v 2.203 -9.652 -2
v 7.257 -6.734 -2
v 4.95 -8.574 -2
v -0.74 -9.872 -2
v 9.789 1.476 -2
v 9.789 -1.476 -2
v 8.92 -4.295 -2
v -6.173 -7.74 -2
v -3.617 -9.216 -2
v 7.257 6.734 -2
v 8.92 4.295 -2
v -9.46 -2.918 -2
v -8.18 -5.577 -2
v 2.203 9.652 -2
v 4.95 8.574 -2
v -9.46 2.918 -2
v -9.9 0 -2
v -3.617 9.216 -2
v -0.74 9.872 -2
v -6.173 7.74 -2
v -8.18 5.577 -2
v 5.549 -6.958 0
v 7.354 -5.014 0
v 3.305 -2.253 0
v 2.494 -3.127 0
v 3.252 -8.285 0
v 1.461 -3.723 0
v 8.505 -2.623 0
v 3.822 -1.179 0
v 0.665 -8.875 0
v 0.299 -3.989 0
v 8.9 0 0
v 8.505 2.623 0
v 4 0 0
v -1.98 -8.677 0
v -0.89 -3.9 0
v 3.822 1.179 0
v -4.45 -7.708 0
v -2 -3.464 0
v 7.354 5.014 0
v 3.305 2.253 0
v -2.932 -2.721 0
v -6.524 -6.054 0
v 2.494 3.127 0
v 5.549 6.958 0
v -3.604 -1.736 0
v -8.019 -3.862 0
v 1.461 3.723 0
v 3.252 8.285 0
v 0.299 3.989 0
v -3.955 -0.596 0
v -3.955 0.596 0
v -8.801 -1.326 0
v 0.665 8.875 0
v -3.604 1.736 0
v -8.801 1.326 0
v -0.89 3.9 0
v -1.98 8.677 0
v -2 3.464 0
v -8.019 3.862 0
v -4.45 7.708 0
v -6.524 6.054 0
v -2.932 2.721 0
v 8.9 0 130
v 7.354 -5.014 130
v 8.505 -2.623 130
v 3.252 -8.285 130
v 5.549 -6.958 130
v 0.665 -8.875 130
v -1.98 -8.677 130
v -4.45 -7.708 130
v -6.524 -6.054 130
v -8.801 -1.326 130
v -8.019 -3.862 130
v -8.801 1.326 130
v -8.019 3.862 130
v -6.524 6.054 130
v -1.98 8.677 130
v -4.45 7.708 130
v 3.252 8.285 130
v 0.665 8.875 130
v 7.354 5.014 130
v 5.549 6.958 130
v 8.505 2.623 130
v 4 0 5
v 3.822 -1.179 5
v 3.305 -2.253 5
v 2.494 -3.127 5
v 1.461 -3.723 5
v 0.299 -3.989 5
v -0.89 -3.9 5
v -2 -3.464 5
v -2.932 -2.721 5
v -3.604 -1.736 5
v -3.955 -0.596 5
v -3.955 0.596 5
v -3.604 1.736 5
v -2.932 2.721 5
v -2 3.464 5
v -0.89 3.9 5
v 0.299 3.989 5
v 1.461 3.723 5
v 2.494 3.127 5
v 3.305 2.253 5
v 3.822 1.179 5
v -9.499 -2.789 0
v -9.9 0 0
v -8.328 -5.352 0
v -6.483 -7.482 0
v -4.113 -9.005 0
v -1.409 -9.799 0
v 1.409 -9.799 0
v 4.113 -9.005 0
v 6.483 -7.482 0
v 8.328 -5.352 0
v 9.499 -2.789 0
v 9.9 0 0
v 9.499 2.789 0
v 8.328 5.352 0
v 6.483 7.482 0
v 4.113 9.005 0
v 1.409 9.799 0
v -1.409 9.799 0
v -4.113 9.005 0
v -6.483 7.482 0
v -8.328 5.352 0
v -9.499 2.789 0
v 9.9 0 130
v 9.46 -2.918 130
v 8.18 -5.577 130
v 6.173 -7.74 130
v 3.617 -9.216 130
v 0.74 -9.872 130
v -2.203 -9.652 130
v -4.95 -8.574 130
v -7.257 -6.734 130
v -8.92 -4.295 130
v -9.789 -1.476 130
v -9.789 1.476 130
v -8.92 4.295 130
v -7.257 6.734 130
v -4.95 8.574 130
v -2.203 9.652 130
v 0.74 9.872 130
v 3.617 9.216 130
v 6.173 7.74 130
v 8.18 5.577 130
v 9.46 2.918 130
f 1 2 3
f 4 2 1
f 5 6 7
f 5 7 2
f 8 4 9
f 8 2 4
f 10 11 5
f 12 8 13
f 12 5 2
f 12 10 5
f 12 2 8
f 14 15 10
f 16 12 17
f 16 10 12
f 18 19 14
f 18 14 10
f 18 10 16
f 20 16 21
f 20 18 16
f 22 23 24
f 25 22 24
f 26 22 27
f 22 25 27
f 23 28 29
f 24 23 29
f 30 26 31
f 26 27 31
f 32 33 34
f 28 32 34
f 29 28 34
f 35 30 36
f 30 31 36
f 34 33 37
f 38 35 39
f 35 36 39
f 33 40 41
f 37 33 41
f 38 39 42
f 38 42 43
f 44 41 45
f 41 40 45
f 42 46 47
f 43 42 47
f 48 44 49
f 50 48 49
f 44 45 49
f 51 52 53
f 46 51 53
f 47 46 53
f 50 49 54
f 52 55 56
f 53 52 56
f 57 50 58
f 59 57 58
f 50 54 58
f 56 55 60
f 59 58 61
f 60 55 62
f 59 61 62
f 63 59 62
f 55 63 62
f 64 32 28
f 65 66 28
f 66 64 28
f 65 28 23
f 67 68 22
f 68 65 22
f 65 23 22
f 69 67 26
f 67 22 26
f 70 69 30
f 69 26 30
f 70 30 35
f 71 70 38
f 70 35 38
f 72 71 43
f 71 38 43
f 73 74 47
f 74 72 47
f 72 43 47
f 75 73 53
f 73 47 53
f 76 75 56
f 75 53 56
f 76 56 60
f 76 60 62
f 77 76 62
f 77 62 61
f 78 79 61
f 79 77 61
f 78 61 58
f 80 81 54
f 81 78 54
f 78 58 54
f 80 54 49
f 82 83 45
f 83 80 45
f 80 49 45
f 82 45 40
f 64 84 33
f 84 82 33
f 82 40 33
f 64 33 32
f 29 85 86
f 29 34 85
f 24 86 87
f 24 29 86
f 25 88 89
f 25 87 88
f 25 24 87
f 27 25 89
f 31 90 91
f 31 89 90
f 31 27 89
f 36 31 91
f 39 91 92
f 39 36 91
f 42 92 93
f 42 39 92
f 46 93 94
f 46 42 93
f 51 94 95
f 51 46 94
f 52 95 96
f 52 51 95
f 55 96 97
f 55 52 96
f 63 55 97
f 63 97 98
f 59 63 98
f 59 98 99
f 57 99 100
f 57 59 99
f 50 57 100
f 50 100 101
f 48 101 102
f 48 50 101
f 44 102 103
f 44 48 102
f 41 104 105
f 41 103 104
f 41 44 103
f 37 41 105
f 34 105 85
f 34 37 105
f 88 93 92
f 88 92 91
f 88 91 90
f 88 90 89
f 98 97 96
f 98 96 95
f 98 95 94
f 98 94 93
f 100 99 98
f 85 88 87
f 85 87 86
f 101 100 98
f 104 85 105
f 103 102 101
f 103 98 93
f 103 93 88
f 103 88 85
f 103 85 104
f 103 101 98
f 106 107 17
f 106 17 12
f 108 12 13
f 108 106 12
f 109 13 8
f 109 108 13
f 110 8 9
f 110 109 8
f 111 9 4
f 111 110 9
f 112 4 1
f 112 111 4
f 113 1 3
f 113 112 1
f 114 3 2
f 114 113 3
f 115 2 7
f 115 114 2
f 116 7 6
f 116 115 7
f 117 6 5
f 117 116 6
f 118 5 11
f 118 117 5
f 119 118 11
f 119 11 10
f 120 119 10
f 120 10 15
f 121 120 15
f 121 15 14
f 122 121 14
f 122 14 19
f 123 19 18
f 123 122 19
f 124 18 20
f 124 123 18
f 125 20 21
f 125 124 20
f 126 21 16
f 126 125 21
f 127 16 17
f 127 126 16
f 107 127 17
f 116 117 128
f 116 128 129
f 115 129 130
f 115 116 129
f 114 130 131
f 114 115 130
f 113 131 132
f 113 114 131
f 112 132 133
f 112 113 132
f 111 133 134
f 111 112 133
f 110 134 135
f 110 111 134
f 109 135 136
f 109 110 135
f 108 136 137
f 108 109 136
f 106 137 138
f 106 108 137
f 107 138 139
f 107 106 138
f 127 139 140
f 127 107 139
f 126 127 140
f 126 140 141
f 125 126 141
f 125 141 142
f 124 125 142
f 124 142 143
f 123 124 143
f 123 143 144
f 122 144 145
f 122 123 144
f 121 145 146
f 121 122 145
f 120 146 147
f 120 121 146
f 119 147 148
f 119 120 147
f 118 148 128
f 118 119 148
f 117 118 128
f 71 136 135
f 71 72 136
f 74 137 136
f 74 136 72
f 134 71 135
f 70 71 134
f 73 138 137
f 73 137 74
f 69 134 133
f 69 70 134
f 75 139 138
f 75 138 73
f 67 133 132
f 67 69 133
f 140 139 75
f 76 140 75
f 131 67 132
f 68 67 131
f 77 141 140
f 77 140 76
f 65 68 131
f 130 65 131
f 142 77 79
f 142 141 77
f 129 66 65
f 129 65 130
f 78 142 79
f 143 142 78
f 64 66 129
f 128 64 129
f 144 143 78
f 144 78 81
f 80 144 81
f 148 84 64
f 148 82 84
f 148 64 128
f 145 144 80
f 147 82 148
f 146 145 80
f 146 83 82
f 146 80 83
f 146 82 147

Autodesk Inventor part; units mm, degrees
ref_plane "YZ Plane" through (0, 0, 0) normal (1, 0, 0) x (0, 1, 0)
ref_plane "XZ Plane" through (0, 0, 0) normal (0, 1, 0) x (-1, 0, 0)
ref_plane "XY Plane" through (0, 0, 0) normal (0, 0, 1) x (1, 0, 0)
sketch "Sketch1" plane through (0, 0, 0) normal (0, 0, 1) x (1, 0, 0)
  circle A0 centre (0, 0) radius 8.9
  circle A1 centre (0, 0) radius 9.9
  dimension "d0" = 17.8
  dimension "d1" = 19.8
extrude "Extrusion1" add sketch "Sketch1" along normal blind 130
sketch "Sketch2" plane through (0, 0, 0) normal (0, 0, -1) x (-1, 0, 0)
  circle A0 centre (0, 0) radius 9.9
  circle A1 centre (0, 0) radius 4
  dimension "d4" = 8
extrude "Extrusion2" add sketch "Sketch2" along normal blind 2 contours A0 | A1
sketch "Sketch3" plane through (0, 0, 0) normal (0, 0, 1) x (1, 0, 0)
  circle A0 centre (0, 0) radius 4
  dimension "d7" = 8
extrude "Extrusion3" add sketch "Sketch3" along normal blind 5
properties part number "cuerpo"
